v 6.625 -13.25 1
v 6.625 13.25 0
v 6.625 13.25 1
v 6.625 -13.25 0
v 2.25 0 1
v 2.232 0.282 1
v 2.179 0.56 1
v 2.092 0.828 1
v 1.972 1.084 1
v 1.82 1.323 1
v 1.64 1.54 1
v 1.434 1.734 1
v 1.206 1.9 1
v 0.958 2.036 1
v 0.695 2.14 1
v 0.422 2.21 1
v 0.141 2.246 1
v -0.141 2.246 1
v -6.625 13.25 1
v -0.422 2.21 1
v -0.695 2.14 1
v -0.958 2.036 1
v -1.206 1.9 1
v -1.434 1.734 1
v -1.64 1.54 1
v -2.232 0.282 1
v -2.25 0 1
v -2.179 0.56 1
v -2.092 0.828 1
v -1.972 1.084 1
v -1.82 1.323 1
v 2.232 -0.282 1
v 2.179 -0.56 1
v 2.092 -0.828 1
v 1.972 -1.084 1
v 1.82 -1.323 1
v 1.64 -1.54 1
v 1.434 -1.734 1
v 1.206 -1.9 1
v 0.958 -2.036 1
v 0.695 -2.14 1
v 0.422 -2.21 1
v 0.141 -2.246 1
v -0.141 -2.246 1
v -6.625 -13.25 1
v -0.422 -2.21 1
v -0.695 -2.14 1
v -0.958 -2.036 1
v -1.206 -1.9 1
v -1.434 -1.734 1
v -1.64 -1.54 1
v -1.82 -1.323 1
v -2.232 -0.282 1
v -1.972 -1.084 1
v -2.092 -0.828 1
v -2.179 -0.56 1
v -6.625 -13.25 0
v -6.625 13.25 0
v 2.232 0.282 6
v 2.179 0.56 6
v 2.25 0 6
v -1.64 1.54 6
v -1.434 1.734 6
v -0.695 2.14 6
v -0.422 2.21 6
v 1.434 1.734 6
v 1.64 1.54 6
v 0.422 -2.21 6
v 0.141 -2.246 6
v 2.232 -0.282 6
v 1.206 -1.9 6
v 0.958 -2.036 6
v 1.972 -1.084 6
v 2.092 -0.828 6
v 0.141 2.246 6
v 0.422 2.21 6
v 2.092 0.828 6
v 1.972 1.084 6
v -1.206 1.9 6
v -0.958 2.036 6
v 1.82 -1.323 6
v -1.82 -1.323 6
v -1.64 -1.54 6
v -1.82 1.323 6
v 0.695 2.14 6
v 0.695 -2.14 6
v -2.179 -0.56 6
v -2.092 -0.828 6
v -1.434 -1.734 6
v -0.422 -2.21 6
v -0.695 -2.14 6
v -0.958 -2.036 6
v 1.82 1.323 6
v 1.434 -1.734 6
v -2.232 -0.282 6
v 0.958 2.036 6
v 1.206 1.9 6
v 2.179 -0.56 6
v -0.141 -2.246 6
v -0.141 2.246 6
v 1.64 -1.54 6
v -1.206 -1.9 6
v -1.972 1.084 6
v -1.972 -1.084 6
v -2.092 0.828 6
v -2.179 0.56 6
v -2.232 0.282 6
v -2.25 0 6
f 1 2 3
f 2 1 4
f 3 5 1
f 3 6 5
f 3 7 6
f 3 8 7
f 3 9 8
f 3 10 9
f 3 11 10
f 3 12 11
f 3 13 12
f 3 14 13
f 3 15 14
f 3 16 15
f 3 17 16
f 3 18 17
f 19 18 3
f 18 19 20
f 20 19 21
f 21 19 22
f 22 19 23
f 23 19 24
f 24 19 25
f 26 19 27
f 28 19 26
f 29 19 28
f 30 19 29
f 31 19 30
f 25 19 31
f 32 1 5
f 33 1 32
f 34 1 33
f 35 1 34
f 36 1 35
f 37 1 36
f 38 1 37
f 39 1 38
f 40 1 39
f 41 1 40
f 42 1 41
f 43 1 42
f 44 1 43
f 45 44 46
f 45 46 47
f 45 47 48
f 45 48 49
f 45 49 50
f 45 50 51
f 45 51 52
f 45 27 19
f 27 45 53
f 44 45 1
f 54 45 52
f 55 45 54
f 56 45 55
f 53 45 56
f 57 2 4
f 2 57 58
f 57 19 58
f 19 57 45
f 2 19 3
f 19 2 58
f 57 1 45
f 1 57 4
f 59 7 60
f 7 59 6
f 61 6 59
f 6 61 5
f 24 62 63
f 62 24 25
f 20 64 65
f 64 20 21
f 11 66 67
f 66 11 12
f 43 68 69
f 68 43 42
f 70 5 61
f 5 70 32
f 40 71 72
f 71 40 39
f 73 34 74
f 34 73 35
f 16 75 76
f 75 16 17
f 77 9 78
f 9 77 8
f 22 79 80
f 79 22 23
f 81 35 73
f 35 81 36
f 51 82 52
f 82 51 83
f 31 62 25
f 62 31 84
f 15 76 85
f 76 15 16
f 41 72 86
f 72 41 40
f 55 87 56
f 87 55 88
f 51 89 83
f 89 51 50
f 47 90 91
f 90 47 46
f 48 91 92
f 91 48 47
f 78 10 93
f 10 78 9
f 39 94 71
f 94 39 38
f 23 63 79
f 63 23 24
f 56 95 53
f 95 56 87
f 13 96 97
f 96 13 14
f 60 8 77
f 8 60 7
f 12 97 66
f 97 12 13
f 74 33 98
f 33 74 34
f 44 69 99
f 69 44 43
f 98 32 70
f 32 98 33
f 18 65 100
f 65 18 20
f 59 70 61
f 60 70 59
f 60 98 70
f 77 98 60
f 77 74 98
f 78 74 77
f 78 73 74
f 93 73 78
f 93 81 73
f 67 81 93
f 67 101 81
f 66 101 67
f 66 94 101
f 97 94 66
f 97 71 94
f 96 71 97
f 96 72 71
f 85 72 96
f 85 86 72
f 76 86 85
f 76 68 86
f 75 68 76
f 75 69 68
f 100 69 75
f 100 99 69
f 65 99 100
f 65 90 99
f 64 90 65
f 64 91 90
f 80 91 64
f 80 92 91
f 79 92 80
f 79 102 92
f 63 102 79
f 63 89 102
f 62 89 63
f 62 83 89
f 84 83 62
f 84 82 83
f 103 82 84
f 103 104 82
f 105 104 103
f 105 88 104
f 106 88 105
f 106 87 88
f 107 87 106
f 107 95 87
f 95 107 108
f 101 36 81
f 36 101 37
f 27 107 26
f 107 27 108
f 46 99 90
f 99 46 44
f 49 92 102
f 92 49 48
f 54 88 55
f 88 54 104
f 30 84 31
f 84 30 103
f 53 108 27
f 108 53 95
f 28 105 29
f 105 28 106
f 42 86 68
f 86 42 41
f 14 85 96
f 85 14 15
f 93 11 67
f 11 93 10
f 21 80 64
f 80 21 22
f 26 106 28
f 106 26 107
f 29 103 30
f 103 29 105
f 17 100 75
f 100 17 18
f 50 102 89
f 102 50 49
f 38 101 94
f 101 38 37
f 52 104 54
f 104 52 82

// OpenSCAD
// Copyright 2024 Martin Scheidt (Attribution 4.0 International, CC-BY 4.0)
//
// You are free to copy and redistribute the material in any medium or format.
// You are free to remix, transform, and build upon the material for any purpose, even commercially.
// You must give appropriate credit, provide a link to the license, and indicate if changes were made.
// You may not apply legal terms or technological measures that legally restrict others from doing anything the license permits.
// No warranties are given.

include<./specification_of_components.scad>
$fn = 50;

balise();
module balise(){
    translate([0,0,balise_height/2]) cube([balise_width, balise_depth, balise_height], center = true);
    translate([0,0,balise_height]) cylinder(d=balise_pin_diameter, h=balise_pin_height);
}
